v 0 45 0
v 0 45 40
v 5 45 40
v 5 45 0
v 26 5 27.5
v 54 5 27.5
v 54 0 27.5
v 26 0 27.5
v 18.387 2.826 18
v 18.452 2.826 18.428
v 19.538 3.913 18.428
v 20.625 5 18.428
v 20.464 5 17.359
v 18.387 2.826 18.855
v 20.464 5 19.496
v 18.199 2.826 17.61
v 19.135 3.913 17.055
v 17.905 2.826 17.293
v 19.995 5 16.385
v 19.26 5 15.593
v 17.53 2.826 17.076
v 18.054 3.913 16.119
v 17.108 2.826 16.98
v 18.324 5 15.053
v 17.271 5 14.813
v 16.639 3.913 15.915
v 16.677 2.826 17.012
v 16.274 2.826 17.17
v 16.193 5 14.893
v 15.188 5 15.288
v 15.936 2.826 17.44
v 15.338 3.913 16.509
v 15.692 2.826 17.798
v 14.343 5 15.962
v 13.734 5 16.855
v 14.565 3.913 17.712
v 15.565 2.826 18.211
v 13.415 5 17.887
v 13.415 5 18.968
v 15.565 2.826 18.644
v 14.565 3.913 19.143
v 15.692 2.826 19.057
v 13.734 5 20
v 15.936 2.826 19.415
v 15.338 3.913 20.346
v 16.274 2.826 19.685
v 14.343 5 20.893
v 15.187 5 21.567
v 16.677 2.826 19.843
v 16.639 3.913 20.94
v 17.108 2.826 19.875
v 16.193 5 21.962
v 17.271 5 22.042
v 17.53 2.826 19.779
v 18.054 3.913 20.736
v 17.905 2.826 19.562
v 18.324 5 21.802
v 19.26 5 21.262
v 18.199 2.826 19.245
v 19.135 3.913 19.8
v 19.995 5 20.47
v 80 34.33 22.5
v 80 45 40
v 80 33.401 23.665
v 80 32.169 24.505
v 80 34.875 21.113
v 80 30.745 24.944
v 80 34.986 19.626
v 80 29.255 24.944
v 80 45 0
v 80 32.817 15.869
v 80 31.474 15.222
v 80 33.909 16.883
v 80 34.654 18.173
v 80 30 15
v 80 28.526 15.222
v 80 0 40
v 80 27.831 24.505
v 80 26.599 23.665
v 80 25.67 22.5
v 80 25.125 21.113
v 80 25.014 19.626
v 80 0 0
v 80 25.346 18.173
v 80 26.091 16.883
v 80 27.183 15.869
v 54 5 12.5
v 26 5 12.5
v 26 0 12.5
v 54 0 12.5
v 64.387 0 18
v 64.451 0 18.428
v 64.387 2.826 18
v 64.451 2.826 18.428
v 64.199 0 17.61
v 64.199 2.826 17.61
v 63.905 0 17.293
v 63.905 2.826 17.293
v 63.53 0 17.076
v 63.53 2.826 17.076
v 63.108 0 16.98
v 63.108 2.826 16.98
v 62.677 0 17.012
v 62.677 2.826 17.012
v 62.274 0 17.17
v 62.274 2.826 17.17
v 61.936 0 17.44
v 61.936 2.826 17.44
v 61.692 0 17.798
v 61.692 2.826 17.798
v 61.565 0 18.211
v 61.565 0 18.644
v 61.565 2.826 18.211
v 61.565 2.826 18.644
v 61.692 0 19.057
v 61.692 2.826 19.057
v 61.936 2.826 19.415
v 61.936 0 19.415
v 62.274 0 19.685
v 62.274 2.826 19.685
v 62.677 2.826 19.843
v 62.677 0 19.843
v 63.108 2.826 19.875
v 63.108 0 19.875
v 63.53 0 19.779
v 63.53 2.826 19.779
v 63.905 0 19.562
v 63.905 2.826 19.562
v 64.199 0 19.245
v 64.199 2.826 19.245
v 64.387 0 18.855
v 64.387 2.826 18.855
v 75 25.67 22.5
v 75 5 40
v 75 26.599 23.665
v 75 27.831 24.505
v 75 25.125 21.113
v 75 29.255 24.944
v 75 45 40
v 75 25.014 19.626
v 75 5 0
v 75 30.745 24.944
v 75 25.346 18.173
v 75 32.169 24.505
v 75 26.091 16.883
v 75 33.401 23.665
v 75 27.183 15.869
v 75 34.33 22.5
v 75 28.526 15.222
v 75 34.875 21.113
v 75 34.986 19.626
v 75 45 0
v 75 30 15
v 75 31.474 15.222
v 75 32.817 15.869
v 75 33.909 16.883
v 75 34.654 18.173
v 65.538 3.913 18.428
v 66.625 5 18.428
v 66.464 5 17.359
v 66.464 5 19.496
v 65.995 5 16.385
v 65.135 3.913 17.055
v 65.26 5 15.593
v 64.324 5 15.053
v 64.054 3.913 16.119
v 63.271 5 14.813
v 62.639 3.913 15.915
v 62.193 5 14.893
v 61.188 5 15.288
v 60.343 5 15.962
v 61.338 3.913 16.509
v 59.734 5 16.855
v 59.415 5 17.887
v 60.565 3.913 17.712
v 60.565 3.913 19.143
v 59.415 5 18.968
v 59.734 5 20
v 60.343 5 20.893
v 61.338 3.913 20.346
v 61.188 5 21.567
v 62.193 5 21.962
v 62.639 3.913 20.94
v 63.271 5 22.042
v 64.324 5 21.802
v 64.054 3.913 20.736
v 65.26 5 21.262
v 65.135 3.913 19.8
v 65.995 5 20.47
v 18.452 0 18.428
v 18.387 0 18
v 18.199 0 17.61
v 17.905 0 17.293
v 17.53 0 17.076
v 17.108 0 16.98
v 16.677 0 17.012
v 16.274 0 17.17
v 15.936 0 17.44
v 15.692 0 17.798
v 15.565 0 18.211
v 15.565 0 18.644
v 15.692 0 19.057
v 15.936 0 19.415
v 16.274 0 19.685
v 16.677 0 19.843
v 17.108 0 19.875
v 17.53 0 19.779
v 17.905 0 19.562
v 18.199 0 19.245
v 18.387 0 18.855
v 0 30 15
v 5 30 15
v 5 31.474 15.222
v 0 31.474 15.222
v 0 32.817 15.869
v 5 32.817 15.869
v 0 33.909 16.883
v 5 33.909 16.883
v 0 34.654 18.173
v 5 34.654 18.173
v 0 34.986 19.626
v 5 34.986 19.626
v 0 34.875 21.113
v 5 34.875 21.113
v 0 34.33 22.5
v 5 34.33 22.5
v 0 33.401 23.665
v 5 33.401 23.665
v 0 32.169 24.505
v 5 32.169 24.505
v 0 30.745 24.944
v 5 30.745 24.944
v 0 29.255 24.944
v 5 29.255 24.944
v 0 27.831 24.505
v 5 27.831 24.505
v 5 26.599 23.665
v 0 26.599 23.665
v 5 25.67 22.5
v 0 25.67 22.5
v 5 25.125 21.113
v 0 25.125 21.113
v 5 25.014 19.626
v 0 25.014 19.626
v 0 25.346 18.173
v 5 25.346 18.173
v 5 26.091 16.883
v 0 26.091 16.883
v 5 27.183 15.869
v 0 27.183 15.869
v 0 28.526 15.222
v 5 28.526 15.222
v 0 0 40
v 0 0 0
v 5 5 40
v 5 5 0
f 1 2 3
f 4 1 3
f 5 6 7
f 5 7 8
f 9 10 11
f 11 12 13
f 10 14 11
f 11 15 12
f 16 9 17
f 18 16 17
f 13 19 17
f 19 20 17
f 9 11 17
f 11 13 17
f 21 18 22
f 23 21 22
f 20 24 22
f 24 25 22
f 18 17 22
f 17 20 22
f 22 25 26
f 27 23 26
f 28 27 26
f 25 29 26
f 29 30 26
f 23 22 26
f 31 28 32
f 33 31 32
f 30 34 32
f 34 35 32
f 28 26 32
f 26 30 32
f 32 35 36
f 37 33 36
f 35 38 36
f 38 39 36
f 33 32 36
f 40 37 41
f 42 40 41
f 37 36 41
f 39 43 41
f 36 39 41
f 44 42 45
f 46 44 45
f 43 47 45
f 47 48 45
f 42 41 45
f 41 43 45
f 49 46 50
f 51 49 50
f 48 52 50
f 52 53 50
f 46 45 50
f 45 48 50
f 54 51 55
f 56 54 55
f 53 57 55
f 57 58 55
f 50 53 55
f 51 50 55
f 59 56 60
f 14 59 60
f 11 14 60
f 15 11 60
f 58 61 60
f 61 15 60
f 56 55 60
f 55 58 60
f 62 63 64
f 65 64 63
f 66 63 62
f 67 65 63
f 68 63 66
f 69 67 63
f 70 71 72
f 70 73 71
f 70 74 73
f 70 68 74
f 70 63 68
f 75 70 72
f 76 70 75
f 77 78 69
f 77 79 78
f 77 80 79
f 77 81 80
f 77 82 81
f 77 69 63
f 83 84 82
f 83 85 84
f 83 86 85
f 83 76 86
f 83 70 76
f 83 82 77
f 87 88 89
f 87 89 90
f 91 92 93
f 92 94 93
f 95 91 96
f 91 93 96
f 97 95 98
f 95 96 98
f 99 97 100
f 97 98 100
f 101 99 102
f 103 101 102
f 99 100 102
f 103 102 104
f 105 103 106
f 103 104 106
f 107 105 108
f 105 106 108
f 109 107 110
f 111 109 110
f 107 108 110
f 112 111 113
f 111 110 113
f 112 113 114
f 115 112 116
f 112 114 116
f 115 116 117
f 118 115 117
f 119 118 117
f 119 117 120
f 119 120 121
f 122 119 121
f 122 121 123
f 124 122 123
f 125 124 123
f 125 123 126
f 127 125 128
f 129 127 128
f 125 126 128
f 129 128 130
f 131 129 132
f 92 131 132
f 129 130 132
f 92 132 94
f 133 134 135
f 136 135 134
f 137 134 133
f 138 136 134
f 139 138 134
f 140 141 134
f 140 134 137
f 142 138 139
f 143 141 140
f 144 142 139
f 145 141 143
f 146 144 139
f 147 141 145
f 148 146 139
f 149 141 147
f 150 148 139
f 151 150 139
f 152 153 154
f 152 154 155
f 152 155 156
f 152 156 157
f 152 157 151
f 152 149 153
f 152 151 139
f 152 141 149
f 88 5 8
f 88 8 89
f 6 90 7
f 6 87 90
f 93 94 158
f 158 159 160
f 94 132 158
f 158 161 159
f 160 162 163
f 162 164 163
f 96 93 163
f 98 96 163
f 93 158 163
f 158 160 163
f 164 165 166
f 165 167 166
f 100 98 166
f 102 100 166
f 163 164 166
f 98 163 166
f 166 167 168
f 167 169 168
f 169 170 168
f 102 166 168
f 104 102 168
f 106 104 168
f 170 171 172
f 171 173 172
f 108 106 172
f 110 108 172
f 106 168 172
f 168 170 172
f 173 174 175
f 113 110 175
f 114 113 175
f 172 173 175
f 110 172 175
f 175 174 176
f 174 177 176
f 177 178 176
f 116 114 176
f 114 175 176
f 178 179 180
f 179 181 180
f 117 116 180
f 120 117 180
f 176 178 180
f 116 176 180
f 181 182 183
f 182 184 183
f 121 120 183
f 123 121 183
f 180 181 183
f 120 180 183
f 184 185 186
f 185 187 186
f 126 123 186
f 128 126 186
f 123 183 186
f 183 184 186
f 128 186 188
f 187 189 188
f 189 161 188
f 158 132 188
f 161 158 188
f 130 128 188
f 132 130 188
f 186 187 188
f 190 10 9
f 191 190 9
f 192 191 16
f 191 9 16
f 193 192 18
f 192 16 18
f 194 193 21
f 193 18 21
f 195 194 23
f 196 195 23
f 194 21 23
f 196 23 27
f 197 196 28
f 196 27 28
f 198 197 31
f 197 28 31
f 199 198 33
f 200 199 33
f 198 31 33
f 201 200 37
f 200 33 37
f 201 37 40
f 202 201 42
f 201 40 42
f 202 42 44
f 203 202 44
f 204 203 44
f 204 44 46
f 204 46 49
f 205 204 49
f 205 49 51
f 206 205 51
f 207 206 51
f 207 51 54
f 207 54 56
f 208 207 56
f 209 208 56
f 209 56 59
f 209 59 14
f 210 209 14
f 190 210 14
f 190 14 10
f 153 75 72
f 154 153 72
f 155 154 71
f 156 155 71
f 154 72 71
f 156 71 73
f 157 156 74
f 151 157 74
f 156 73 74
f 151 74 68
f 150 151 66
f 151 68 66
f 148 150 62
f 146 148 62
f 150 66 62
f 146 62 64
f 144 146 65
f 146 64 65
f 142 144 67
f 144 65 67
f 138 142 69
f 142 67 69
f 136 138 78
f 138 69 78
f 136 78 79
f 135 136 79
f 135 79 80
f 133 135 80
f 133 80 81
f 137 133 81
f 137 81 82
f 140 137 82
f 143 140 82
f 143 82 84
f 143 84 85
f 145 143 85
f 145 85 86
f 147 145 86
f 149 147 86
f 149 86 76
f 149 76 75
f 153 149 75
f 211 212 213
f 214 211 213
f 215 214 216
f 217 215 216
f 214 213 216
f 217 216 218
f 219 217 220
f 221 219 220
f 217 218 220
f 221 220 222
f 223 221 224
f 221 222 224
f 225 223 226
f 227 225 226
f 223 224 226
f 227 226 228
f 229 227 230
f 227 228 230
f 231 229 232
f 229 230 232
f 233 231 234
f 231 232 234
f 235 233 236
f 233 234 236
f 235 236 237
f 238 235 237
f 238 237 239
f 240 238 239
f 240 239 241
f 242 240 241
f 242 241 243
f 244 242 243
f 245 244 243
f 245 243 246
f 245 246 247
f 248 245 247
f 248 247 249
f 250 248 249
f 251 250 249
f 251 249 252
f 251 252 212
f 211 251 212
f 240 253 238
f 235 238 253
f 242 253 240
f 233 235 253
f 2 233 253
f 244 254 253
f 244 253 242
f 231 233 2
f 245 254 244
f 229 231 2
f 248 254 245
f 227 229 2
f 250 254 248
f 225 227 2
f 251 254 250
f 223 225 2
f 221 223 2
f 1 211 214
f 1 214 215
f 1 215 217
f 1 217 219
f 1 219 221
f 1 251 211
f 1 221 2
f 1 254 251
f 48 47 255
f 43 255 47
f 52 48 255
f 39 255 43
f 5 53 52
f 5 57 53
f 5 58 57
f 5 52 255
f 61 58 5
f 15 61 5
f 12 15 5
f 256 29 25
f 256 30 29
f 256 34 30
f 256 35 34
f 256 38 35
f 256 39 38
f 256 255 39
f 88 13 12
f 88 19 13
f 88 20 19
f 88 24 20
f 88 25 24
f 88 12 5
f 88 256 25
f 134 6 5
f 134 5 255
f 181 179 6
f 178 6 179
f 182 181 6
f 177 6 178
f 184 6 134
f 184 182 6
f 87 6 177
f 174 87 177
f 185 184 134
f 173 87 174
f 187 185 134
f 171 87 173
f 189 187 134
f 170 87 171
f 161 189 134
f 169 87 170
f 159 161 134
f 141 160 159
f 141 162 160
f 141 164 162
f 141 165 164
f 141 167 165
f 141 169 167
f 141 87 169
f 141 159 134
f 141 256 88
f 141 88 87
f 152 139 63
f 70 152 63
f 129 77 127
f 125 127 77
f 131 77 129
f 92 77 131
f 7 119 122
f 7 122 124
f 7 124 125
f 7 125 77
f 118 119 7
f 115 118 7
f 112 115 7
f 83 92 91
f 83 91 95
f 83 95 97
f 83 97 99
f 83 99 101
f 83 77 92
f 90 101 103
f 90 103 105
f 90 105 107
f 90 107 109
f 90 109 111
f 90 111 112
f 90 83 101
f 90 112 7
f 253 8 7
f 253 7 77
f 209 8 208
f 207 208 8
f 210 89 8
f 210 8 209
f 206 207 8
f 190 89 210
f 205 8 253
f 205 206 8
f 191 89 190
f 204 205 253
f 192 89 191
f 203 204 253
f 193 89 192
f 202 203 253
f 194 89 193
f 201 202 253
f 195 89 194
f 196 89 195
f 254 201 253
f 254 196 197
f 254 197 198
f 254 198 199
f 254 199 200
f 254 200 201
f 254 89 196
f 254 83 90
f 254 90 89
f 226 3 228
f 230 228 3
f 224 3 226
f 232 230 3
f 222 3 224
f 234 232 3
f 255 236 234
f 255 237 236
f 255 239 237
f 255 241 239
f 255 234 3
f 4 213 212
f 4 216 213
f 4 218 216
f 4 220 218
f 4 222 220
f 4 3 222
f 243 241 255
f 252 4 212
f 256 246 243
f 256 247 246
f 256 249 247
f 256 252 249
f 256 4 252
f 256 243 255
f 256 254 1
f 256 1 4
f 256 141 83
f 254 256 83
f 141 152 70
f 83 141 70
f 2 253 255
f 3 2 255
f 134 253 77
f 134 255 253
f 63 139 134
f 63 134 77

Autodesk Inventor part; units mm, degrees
ref_plane "YZ Plane" through (0, 0, 0) normal (1, 0, 0) x (0, 1, 0)
ref_plane "XZ Plane" through (0, 0, 0) normal (0, 1, 0) x (-1, 0, 0)
ref_plane "XY Plane" through (0, 0, 0) normal (0, 0, 1) x (1, 0, 0)
sketch "Sketch1" plane through (0, 0, 0) normal (0, 0, 1) x (1, 0, 0)
  line L0 (0, 0) -> (0, 45)
  line L1 (0, 45) -> (5, 45)
  line L2 (5, 45) -> (5, 5)
  line L3 (5, 5) -> (75, 5)
  line L4 (75, 5) -> (75, 45)
  line L5 (75, 45) -> (80, 45)
  line L6 (80, 45) -> (80, 0)
  line L7 (80, 0) -> (0, 0)
  dimension "d0" = 45
  dimension "d1" = 5
  dimension "d2" = 40
  dimension "d3" = 70
  dimension "d4" = 40
  dimension "d5" = 5
  dimension "d6" = 45
extrude "Extrusion1" add sketch "Sketch1" along normal blind 40
sketch "Sketch2" plane through (80, 0, 0) normal (1, 0, 0) x (0, 0, -1)
  circle A0 centre (-20, 30) radius 5
  line L0 (0, 45) -> (-40, 45) projected
  line L1 (0, 0) -> (0, 45) projected
  dimension "d9" = 10
  dimension "d10" = 15
  dimension "d11" = 20
extrude "Extrusion2" cut sketch "Sketch2" against normal through all
sketch "Sketch3" plane through (5, 5, 0) normal (0, 1, 0) x (1, 0, 0)
  line L0 (21, -12.5) -> (49, -12.5)
  line L1 (49, -12.5) -> (49, -27.5)
  line L2 (49, -27.5) -> (21, -27.5)
  line L3 (21, -27.5) -> (21, -12.5)
  line L4 (21, -12.5) -> (49, -27.5) construction
  line L5 (49, -12.5) -> (21, -27.5) construction
  line L6 (70, 0) -> (0, 0) projected
  line L7 (0, 0) -> (0, -40) projected
  point P0 (-5, 0)
  point P1 (35, -20)
  dimension "d14" = 28
  dimension "d15" = 15
  dimension "d16" = 20
  dimension "d17" = 35
extrude "Extrusion3" cut sketch "Sketch3" against normal blind 10
sketch "Sketch4" plane through (5, 5, 0) normal (0, 1, 0) x (1, 0, 0)
  circle A0 centre (12, -18.4275) radius 3.625
  circle A1 centre (58, -18.4275) radius 3.625
  line L0 (21, -27.5) -> (21, -12.5) projected
  line L1 (49, -12.5) -> (49, -27.5) projected
  point P0 (-5, 0)
  dimension "d20" = 7.25
  dimension "d21" = 7.25
  dimension "d22" = 9
  dimension "d23" = 9
extrude "Extrusion4" cut sketch "Sketch4" against normal blind 2.1735 draft -45
sketch "Sketch5" plane through (17, 2.8265, 18.4275) normal (0, 1, 0) x (1, 0, 0)
  circle A0 centre (0, 0) radius 1.4515
  circle A1 centre (46, 0) radius 1.4515
  line L0 (37, 5.9275) -> (37, -9.0725) projected
  point P0 (-17, 18.4275)
  dimension "d26" = 2.903
  dimension "d27" = 9
extrude "Extrusion5" cut sketch "Sketch5" against normal through all
properties part number "base and 1st arm link"
